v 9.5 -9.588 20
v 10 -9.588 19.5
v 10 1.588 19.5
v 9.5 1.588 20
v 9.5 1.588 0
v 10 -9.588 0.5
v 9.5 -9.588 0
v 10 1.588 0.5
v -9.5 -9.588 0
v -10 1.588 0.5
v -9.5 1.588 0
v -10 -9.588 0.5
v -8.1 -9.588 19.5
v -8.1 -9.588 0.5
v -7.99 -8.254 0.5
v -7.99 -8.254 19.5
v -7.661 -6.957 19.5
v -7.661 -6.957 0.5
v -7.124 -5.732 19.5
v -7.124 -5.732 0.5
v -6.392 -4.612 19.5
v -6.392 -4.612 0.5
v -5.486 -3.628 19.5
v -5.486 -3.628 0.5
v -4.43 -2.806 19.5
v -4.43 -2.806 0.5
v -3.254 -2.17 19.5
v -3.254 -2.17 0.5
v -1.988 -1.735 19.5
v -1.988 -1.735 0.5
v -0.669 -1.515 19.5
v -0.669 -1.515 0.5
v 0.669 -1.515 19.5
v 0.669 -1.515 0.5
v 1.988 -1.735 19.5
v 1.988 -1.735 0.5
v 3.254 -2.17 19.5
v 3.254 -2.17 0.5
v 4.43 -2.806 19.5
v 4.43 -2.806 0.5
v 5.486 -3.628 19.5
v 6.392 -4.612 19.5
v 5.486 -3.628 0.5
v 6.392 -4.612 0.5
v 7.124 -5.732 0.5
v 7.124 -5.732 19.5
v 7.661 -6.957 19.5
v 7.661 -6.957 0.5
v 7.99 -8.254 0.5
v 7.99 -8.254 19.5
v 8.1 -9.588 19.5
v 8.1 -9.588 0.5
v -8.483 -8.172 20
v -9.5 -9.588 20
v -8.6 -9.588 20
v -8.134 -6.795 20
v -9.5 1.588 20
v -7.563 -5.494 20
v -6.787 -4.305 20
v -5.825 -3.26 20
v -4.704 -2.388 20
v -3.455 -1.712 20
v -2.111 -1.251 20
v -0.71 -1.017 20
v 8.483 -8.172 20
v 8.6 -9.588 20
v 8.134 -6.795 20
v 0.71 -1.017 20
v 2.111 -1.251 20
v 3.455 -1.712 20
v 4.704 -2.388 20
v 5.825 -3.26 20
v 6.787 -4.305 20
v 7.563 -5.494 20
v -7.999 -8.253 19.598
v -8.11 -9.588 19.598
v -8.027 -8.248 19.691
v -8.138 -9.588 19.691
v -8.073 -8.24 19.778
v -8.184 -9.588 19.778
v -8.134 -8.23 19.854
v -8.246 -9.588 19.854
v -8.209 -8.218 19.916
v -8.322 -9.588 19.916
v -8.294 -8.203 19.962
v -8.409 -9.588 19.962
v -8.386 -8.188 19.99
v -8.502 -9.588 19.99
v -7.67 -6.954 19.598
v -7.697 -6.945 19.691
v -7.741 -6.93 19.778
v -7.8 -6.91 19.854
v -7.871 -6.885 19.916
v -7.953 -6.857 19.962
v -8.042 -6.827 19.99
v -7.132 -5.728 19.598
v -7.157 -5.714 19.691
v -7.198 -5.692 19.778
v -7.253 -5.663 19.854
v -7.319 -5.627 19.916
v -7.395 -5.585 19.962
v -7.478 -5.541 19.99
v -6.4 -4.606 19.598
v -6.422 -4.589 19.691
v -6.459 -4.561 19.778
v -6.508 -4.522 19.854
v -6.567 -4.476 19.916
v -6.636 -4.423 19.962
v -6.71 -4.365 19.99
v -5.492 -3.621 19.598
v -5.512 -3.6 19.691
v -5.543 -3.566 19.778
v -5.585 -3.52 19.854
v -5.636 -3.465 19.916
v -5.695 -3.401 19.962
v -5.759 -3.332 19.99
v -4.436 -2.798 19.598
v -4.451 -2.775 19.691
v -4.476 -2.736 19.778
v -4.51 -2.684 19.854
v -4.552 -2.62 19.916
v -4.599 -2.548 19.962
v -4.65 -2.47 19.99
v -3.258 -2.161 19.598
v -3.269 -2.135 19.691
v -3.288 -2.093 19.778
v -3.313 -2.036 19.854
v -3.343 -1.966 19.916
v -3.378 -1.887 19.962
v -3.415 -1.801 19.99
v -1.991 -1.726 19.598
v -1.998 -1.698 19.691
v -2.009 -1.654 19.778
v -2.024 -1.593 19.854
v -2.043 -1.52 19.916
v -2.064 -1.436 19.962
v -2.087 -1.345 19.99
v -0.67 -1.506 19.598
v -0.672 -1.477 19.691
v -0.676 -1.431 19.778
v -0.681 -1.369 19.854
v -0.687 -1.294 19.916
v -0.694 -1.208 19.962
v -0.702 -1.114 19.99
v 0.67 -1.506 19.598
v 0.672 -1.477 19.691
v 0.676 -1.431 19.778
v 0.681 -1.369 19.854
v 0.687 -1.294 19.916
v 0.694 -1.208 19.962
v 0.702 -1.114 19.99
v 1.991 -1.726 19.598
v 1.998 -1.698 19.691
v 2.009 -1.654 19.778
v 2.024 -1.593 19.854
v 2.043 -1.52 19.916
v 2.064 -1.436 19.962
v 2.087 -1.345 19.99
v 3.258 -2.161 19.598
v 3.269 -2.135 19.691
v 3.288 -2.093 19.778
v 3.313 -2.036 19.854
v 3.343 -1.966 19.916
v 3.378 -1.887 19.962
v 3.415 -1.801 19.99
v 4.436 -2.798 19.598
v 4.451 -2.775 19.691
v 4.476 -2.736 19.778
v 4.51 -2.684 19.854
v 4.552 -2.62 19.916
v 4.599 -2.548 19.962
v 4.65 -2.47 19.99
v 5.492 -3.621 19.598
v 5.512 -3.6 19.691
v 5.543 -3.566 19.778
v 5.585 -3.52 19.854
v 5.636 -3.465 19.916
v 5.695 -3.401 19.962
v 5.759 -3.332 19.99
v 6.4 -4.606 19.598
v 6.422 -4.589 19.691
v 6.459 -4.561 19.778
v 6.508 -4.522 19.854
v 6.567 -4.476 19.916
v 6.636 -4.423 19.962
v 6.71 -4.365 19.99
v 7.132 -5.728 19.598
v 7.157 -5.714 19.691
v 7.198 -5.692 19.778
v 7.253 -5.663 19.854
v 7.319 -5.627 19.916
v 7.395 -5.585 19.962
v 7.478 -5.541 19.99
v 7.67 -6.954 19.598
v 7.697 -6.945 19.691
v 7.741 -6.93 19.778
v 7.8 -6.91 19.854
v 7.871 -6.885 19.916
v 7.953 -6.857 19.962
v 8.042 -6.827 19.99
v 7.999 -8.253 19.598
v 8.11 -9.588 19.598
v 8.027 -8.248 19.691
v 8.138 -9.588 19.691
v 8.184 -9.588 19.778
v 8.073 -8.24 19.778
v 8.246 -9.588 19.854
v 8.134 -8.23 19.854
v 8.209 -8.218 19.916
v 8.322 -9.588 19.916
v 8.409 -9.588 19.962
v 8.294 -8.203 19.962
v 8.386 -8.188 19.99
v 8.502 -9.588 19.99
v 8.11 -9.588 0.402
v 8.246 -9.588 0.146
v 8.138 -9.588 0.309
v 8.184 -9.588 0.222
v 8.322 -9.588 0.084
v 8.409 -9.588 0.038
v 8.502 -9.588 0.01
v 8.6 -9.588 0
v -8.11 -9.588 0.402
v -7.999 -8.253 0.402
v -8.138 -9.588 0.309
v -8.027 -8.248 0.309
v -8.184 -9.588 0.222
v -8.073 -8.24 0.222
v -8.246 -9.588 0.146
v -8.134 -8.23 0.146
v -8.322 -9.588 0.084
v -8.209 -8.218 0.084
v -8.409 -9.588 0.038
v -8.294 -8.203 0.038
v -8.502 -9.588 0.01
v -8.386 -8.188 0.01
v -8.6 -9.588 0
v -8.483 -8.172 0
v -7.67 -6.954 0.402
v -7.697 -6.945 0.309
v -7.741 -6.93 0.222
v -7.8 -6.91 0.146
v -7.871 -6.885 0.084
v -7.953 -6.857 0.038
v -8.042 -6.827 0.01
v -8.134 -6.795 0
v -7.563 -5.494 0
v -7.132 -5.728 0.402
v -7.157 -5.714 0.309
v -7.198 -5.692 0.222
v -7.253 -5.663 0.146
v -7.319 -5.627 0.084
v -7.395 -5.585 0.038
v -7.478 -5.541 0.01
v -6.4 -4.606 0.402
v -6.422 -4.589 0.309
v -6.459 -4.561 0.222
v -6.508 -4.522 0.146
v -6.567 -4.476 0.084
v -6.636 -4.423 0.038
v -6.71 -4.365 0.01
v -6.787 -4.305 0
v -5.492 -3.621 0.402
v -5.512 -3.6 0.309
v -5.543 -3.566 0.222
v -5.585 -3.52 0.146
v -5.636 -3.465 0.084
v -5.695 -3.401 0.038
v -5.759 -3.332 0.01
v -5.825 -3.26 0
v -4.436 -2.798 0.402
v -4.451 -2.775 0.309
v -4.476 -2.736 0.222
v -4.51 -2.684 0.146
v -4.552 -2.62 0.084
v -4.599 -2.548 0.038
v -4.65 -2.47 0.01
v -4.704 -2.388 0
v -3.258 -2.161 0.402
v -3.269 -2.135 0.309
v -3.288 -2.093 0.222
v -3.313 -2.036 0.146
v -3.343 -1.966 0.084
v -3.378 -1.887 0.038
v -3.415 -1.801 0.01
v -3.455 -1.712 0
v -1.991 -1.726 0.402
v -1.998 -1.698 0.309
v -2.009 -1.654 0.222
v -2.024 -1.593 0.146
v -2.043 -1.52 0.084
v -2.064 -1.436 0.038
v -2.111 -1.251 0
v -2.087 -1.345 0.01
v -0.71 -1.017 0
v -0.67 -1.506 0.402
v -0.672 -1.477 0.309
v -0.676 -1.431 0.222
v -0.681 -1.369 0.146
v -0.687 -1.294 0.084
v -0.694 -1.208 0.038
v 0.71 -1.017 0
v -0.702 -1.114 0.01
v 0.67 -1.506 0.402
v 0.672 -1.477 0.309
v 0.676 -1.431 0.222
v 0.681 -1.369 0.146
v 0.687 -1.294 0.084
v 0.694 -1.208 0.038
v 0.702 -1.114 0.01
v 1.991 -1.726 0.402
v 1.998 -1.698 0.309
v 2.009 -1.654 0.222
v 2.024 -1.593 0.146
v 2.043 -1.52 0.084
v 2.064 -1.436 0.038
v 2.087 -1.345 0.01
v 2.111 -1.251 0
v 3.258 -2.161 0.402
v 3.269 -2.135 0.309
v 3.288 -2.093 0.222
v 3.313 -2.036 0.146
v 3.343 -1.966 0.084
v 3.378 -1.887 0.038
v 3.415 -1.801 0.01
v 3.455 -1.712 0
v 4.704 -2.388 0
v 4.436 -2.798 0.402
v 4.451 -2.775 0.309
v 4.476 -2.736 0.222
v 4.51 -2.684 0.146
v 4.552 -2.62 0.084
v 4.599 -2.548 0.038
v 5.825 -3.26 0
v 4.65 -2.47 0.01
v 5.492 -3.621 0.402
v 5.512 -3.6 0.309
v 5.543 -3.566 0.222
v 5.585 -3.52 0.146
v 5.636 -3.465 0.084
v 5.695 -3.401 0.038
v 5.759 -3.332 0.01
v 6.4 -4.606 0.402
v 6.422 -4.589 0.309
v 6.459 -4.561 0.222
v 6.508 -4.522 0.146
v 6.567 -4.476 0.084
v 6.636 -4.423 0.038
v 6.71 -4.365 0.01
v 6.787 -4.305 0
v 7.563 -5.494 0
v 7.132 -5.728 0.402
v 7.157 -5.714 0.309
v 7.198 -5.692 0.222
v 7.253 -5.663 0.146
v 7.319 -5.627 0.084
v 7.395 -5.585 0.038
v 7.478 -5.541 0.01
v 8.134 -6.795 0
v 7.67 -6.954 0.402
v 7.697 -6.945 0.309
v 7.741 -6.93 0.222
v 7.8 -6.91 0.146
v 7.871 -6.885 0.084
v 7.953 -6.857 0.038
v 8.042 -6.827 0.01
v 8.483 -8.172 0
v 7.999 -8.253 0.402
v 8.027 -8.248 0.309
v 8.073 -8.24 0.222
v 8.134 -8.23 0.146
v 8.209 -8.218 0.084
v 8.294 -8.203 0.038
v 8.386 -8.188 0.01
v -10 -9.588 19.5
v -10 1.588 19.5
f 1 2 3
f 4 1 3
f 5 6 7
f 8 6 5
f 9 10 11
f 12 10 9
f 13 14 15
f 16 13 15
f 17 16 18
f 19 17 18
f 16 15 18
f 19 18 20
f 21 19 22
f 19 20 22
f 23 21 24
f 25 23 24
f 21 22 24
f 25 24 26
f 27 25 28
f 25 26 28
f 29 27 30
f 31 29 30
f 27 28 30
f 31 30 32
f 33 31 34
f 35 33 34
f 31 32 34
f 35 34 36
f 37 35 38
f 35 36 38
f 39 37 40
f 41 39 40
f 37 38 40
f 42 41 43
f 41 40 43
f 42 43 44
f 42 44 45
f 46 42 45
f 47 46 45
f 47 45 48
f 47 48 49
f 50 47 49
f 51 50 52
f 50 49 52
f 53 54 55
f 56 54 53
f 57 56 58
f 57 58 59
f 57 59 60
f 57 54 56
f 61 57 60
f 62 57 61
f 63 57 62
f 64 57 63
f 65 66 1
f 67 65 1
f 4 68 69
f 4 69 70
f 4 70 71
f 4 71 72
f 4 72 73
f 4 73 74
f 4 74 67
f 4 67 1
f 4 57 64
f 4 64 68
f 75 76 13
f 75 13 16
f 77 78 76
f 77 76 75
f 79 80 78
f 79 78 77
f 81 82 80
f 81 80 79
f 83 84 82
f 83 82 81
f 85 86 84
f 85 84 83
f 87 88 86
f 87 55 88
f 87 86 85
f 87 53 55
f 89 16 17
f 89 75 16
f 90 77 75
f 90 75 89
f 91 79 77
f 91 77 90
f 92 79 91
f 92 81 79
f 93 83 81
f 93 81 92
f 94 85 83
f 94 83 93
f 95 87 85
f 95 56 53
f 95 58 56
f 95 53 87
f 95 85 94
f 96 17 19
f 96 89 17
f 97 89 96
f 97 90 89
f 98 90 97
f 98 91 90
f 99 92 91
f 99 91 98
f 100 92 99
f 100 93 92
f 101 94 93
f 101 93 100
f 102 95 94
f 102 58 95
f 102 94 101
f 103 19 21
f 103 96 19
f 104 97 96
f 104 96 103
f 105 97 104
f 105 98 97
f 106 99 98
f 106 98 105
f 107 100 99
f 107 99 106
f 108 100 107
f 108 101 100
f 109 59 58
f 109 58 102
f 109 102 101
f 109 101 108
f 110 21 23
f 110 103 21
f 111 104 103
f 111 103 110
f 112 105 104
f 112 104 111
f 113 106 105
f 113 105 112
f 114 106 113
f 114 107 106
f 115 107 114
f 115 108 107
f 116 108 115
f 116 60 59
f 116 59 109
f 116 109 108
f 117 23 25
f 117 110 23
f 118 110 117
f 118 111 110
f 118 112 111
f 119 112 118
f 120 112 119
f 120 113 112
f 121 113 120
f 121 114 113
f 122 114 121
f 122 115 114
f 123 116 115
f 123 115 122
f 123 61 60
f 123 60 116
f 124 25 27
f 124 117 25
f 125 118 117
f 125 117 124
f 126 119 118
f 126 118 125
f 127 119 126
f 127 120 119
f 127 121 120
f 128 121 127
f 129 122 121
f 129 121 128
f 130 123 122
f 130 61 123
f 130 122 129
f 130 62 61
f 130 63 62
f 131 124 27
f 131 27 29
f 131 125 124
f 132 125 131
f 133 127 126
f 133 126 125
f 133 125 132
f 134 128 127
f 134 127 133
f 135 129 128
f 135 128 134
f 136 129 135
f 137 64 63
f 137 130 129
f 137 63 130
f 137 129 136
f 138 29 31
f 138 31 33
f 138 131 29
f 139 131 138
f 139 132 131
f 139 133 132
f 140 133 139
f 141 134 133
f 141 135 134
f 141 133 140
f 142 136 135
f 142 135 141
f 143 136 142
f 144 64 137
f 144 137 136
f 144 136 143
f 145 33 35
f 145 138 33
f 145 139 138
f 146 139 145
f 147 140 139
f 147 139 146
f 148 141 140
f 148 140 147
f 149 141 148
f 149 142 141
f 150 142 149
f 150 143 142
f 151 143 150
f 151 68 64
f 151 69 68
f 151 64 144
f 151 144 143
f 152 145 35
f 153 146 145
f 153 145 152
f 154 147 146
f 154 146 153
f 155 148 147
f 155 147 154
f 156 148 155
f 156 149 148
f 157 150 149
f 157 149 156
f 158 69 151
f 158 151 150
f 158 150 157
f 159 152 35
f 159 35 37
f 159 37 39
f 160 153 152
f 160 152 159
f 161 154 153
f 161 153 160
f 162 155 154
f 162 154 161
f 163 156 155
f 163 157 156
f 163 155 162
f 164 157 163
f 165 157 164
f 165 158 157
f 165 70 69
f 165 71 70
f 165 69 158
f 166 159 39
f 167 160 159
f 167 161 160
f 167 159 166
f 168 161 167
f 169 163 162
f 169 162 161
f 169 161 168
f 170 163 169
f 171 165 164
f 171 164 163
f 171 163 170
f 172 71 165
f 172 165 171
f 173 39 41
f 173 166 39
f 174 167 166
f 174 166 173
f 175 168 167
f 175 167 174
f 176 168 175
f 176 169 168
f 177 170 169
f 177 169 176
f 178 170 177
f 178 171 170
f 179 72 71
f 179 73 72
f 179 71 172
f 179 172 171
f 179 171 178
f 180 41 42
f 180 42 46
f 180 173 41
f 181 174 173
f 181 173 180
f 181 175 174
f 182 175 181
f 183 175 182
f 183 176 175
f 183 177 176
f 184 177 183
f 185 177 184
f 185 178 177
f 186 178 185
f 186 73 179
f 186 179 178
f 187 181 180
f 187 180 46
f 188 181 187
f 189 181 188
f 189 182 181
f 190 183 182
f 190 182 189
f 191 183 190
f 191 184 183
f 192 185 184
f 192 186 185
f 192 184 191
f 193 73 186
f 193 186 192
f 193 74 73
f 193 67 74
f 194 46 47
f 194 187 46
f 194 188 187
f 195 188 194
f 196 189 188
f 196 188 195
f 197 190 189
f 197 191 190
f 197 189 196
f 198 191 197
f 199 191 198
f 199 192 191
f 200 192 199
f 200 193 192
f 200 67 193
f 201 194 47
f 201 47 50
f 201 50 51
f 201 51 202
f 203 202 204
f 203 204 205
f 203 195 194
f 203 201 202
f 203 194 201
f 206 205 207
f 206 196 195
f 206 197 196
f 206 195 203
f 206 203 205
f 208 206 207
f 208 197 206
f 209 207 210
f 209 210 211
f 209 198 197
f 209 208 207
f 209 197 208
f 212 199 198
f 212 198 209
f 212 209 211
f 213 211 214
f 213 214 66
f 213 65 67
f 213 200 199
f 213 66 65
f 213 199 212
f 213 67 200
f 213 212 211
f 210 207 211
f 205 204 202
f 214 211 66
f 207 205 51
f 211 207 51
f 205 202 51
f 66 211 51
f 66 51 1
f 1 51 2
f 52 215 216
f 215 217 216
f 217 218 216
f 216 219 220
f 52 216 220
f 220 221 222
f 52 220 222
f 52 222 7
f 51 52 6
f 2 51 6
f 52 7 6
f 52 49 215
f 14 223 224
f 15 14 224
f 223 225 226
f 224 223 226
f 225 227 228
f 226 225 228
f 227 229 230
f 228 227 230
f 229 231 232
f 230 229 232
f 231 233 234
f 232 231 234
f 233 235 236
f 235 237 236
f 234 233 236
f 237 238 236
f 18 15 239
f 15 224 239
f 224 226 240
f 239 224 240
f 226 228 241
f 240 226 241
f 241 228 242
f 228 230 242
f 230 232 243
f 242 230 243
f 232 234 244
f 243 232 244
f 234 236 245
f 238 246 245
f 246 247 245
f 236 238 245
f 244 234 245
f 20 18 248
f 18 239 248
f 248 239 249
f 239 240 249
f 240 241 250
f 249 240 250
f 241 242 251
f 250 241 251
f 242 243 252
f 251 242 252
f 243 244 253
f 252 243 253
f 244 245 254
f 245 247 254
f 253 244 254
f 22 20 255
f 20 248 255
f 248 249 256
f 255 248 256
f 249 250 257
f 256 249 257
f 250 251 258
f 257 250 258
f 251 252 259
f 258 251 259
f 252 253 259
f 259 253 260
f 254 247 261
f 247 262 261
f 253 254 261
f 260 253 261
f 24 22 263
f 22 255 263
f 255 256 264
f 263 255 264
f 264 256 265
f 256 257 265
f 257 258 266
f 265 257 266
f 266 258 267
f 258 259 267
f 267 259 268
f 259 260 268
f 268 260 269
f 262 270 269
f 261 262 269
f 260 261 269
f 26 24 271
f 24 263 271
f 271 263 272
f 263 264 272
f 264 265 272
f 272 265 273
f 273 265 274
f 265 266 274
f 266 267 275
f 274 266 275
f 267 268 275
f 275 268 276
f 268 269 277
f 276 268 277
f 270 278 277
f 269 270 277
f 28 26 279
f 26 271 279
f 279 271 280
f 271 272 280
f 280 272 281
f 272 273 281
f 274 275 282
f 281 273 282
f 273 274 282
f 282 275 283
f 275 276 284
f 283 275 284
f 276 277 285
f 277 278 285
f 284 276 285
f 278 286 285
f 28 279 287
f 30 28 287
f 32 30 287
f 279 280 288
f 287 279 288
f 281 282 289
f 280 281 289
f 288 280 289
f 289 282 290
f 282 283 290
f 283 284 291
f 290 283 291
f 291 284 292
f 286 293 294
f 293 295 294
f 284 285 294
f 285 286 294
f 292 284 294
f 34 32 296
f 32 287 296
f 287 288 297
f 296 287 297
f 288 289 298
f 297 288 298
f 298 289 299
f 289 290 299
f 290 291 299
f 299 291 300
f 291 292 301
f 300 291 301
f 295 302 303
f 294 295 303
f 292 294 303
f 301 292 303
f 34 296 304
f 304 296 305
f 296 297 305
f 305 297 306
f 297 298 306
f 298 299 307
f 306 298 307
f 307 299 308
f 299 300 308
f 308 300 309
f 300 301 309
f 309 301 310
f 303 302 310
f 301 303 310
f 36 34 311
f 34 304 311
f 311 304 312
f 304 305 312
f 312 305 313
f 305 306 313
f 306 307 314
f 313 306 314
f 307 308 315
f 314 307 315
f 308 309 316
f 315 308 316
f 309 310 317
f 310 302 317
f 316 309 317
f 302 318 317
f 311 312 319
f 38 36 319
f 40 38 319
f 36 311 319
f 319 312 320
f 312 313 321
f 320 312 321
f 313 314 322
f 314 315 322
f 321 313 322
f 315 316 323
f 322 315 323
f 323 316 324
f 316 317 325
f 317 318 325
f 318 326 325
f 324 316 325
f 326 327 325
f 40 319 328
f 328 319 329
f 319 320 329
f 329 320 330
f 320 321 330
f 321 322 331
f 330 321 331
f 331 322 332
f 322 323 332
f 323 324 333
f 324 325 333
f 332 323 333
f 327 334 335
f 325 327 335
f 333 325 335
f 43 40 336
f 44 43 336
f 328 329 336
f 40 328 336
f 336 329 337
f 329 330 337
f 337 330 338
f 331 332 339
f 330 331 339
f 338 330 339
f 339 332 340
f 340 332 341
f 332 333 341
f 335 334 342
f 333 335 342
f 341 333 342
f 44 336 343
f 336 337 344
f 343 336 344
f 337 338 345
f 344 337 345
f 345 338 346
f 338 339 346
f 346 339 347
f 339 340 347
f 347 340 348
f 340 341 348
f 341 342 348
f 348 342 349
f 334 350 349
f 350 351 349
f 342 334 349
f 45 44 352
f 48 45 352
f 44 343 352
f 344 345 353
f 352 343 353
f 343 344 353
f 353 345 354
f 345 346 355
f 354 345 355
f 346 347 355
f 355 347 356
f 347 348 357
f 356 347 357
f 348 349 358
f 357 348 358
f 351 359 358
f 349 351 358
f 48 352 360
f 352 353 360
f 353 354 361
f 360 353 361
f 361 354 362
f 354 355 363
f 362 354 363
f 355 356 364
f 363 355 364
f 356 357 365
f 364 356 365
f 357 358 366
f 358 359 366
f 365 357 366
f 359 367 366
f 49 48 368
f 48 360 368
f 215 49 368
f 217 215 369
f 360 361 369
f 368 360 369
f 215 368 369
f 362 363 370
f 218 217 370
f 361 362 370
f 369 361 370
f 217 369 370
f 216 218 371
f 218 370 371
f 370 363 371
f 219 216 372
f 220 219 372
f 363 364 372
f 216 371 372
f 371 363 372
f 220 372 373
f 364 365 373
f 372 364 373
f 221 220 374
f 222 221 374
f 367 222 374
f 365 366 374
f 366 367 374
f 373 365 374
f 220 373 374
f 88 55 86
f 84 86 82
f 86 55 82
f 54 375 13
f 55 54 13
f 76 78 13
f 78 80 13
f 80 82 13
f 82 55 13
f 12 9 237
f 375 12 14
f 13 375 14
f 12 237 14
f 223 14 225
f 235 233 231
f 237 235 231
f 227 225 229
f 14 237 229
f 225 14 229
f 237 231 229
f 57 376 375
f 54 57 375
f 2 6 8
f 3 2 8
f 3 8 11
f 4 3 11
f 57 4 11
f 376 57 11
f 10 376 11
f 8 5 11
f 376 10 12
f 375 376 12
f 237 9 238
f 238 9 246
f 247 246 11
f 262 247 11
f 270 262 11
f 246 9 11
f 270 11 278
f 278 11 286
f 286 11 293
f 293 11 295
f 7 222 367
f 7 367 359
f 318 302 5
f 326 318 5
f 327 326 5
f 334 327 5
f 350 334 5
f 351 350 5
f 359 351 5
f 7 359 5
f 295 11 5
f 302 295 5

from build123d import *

# Parameters (mm, degrees)
EXTRUDE_1_DEPTH = 20
FILLET_1_R      = 0.5
CHAMFER_1_SIZE  = 0.5


with BuildPart() as part:
    # 草图1 → 凸台-拉伸1 (new body)
    with BuildSketch(Plane.XY):
        with BuildLine():
            Line((-10, -1.5875), (-10, -9.5875))
            Line((-10, -9.5875), (-8.1, -9.5875))
            ThreePointArc((-8.1, -9.5875), (0, -1.4875), (8.1, -9.5875))
            Line((8.1, -9.5875), (10, -9.5875))
            Line((10, -9.5875), (10, -1.5875))
            Line((10, -1.5875), (10, 1.5875))
            Line((10, 1.5875), (-10, 1.5875))
            Line((-10, 1.5875), (-10, -1.5875))
        make_face()
    extrude(amount=EXTRUDE_1_DEPTH)

    # 圆角1
    fillet_1_edges = [part.edges().sort_by_distance(p)[0] for p in [
        (0, -1.4875, 20),
        (0, -1.4875, 0),
    ]]
    fillet(fillet_1_edges, radius=FILLET_1_R)

    # 倒角1
    chamfer_1_edges = [part.edges().sort_by_distance(p)[0] for p in [
        (10, -4, 0),
        (-10, -4, 20),
        (10, -4, 20),
        (-10, -4, 0),
    ]]
    chamfer(chamfer_1_edges, length=CHAMFER_1_SIZE)


solid = part.part
